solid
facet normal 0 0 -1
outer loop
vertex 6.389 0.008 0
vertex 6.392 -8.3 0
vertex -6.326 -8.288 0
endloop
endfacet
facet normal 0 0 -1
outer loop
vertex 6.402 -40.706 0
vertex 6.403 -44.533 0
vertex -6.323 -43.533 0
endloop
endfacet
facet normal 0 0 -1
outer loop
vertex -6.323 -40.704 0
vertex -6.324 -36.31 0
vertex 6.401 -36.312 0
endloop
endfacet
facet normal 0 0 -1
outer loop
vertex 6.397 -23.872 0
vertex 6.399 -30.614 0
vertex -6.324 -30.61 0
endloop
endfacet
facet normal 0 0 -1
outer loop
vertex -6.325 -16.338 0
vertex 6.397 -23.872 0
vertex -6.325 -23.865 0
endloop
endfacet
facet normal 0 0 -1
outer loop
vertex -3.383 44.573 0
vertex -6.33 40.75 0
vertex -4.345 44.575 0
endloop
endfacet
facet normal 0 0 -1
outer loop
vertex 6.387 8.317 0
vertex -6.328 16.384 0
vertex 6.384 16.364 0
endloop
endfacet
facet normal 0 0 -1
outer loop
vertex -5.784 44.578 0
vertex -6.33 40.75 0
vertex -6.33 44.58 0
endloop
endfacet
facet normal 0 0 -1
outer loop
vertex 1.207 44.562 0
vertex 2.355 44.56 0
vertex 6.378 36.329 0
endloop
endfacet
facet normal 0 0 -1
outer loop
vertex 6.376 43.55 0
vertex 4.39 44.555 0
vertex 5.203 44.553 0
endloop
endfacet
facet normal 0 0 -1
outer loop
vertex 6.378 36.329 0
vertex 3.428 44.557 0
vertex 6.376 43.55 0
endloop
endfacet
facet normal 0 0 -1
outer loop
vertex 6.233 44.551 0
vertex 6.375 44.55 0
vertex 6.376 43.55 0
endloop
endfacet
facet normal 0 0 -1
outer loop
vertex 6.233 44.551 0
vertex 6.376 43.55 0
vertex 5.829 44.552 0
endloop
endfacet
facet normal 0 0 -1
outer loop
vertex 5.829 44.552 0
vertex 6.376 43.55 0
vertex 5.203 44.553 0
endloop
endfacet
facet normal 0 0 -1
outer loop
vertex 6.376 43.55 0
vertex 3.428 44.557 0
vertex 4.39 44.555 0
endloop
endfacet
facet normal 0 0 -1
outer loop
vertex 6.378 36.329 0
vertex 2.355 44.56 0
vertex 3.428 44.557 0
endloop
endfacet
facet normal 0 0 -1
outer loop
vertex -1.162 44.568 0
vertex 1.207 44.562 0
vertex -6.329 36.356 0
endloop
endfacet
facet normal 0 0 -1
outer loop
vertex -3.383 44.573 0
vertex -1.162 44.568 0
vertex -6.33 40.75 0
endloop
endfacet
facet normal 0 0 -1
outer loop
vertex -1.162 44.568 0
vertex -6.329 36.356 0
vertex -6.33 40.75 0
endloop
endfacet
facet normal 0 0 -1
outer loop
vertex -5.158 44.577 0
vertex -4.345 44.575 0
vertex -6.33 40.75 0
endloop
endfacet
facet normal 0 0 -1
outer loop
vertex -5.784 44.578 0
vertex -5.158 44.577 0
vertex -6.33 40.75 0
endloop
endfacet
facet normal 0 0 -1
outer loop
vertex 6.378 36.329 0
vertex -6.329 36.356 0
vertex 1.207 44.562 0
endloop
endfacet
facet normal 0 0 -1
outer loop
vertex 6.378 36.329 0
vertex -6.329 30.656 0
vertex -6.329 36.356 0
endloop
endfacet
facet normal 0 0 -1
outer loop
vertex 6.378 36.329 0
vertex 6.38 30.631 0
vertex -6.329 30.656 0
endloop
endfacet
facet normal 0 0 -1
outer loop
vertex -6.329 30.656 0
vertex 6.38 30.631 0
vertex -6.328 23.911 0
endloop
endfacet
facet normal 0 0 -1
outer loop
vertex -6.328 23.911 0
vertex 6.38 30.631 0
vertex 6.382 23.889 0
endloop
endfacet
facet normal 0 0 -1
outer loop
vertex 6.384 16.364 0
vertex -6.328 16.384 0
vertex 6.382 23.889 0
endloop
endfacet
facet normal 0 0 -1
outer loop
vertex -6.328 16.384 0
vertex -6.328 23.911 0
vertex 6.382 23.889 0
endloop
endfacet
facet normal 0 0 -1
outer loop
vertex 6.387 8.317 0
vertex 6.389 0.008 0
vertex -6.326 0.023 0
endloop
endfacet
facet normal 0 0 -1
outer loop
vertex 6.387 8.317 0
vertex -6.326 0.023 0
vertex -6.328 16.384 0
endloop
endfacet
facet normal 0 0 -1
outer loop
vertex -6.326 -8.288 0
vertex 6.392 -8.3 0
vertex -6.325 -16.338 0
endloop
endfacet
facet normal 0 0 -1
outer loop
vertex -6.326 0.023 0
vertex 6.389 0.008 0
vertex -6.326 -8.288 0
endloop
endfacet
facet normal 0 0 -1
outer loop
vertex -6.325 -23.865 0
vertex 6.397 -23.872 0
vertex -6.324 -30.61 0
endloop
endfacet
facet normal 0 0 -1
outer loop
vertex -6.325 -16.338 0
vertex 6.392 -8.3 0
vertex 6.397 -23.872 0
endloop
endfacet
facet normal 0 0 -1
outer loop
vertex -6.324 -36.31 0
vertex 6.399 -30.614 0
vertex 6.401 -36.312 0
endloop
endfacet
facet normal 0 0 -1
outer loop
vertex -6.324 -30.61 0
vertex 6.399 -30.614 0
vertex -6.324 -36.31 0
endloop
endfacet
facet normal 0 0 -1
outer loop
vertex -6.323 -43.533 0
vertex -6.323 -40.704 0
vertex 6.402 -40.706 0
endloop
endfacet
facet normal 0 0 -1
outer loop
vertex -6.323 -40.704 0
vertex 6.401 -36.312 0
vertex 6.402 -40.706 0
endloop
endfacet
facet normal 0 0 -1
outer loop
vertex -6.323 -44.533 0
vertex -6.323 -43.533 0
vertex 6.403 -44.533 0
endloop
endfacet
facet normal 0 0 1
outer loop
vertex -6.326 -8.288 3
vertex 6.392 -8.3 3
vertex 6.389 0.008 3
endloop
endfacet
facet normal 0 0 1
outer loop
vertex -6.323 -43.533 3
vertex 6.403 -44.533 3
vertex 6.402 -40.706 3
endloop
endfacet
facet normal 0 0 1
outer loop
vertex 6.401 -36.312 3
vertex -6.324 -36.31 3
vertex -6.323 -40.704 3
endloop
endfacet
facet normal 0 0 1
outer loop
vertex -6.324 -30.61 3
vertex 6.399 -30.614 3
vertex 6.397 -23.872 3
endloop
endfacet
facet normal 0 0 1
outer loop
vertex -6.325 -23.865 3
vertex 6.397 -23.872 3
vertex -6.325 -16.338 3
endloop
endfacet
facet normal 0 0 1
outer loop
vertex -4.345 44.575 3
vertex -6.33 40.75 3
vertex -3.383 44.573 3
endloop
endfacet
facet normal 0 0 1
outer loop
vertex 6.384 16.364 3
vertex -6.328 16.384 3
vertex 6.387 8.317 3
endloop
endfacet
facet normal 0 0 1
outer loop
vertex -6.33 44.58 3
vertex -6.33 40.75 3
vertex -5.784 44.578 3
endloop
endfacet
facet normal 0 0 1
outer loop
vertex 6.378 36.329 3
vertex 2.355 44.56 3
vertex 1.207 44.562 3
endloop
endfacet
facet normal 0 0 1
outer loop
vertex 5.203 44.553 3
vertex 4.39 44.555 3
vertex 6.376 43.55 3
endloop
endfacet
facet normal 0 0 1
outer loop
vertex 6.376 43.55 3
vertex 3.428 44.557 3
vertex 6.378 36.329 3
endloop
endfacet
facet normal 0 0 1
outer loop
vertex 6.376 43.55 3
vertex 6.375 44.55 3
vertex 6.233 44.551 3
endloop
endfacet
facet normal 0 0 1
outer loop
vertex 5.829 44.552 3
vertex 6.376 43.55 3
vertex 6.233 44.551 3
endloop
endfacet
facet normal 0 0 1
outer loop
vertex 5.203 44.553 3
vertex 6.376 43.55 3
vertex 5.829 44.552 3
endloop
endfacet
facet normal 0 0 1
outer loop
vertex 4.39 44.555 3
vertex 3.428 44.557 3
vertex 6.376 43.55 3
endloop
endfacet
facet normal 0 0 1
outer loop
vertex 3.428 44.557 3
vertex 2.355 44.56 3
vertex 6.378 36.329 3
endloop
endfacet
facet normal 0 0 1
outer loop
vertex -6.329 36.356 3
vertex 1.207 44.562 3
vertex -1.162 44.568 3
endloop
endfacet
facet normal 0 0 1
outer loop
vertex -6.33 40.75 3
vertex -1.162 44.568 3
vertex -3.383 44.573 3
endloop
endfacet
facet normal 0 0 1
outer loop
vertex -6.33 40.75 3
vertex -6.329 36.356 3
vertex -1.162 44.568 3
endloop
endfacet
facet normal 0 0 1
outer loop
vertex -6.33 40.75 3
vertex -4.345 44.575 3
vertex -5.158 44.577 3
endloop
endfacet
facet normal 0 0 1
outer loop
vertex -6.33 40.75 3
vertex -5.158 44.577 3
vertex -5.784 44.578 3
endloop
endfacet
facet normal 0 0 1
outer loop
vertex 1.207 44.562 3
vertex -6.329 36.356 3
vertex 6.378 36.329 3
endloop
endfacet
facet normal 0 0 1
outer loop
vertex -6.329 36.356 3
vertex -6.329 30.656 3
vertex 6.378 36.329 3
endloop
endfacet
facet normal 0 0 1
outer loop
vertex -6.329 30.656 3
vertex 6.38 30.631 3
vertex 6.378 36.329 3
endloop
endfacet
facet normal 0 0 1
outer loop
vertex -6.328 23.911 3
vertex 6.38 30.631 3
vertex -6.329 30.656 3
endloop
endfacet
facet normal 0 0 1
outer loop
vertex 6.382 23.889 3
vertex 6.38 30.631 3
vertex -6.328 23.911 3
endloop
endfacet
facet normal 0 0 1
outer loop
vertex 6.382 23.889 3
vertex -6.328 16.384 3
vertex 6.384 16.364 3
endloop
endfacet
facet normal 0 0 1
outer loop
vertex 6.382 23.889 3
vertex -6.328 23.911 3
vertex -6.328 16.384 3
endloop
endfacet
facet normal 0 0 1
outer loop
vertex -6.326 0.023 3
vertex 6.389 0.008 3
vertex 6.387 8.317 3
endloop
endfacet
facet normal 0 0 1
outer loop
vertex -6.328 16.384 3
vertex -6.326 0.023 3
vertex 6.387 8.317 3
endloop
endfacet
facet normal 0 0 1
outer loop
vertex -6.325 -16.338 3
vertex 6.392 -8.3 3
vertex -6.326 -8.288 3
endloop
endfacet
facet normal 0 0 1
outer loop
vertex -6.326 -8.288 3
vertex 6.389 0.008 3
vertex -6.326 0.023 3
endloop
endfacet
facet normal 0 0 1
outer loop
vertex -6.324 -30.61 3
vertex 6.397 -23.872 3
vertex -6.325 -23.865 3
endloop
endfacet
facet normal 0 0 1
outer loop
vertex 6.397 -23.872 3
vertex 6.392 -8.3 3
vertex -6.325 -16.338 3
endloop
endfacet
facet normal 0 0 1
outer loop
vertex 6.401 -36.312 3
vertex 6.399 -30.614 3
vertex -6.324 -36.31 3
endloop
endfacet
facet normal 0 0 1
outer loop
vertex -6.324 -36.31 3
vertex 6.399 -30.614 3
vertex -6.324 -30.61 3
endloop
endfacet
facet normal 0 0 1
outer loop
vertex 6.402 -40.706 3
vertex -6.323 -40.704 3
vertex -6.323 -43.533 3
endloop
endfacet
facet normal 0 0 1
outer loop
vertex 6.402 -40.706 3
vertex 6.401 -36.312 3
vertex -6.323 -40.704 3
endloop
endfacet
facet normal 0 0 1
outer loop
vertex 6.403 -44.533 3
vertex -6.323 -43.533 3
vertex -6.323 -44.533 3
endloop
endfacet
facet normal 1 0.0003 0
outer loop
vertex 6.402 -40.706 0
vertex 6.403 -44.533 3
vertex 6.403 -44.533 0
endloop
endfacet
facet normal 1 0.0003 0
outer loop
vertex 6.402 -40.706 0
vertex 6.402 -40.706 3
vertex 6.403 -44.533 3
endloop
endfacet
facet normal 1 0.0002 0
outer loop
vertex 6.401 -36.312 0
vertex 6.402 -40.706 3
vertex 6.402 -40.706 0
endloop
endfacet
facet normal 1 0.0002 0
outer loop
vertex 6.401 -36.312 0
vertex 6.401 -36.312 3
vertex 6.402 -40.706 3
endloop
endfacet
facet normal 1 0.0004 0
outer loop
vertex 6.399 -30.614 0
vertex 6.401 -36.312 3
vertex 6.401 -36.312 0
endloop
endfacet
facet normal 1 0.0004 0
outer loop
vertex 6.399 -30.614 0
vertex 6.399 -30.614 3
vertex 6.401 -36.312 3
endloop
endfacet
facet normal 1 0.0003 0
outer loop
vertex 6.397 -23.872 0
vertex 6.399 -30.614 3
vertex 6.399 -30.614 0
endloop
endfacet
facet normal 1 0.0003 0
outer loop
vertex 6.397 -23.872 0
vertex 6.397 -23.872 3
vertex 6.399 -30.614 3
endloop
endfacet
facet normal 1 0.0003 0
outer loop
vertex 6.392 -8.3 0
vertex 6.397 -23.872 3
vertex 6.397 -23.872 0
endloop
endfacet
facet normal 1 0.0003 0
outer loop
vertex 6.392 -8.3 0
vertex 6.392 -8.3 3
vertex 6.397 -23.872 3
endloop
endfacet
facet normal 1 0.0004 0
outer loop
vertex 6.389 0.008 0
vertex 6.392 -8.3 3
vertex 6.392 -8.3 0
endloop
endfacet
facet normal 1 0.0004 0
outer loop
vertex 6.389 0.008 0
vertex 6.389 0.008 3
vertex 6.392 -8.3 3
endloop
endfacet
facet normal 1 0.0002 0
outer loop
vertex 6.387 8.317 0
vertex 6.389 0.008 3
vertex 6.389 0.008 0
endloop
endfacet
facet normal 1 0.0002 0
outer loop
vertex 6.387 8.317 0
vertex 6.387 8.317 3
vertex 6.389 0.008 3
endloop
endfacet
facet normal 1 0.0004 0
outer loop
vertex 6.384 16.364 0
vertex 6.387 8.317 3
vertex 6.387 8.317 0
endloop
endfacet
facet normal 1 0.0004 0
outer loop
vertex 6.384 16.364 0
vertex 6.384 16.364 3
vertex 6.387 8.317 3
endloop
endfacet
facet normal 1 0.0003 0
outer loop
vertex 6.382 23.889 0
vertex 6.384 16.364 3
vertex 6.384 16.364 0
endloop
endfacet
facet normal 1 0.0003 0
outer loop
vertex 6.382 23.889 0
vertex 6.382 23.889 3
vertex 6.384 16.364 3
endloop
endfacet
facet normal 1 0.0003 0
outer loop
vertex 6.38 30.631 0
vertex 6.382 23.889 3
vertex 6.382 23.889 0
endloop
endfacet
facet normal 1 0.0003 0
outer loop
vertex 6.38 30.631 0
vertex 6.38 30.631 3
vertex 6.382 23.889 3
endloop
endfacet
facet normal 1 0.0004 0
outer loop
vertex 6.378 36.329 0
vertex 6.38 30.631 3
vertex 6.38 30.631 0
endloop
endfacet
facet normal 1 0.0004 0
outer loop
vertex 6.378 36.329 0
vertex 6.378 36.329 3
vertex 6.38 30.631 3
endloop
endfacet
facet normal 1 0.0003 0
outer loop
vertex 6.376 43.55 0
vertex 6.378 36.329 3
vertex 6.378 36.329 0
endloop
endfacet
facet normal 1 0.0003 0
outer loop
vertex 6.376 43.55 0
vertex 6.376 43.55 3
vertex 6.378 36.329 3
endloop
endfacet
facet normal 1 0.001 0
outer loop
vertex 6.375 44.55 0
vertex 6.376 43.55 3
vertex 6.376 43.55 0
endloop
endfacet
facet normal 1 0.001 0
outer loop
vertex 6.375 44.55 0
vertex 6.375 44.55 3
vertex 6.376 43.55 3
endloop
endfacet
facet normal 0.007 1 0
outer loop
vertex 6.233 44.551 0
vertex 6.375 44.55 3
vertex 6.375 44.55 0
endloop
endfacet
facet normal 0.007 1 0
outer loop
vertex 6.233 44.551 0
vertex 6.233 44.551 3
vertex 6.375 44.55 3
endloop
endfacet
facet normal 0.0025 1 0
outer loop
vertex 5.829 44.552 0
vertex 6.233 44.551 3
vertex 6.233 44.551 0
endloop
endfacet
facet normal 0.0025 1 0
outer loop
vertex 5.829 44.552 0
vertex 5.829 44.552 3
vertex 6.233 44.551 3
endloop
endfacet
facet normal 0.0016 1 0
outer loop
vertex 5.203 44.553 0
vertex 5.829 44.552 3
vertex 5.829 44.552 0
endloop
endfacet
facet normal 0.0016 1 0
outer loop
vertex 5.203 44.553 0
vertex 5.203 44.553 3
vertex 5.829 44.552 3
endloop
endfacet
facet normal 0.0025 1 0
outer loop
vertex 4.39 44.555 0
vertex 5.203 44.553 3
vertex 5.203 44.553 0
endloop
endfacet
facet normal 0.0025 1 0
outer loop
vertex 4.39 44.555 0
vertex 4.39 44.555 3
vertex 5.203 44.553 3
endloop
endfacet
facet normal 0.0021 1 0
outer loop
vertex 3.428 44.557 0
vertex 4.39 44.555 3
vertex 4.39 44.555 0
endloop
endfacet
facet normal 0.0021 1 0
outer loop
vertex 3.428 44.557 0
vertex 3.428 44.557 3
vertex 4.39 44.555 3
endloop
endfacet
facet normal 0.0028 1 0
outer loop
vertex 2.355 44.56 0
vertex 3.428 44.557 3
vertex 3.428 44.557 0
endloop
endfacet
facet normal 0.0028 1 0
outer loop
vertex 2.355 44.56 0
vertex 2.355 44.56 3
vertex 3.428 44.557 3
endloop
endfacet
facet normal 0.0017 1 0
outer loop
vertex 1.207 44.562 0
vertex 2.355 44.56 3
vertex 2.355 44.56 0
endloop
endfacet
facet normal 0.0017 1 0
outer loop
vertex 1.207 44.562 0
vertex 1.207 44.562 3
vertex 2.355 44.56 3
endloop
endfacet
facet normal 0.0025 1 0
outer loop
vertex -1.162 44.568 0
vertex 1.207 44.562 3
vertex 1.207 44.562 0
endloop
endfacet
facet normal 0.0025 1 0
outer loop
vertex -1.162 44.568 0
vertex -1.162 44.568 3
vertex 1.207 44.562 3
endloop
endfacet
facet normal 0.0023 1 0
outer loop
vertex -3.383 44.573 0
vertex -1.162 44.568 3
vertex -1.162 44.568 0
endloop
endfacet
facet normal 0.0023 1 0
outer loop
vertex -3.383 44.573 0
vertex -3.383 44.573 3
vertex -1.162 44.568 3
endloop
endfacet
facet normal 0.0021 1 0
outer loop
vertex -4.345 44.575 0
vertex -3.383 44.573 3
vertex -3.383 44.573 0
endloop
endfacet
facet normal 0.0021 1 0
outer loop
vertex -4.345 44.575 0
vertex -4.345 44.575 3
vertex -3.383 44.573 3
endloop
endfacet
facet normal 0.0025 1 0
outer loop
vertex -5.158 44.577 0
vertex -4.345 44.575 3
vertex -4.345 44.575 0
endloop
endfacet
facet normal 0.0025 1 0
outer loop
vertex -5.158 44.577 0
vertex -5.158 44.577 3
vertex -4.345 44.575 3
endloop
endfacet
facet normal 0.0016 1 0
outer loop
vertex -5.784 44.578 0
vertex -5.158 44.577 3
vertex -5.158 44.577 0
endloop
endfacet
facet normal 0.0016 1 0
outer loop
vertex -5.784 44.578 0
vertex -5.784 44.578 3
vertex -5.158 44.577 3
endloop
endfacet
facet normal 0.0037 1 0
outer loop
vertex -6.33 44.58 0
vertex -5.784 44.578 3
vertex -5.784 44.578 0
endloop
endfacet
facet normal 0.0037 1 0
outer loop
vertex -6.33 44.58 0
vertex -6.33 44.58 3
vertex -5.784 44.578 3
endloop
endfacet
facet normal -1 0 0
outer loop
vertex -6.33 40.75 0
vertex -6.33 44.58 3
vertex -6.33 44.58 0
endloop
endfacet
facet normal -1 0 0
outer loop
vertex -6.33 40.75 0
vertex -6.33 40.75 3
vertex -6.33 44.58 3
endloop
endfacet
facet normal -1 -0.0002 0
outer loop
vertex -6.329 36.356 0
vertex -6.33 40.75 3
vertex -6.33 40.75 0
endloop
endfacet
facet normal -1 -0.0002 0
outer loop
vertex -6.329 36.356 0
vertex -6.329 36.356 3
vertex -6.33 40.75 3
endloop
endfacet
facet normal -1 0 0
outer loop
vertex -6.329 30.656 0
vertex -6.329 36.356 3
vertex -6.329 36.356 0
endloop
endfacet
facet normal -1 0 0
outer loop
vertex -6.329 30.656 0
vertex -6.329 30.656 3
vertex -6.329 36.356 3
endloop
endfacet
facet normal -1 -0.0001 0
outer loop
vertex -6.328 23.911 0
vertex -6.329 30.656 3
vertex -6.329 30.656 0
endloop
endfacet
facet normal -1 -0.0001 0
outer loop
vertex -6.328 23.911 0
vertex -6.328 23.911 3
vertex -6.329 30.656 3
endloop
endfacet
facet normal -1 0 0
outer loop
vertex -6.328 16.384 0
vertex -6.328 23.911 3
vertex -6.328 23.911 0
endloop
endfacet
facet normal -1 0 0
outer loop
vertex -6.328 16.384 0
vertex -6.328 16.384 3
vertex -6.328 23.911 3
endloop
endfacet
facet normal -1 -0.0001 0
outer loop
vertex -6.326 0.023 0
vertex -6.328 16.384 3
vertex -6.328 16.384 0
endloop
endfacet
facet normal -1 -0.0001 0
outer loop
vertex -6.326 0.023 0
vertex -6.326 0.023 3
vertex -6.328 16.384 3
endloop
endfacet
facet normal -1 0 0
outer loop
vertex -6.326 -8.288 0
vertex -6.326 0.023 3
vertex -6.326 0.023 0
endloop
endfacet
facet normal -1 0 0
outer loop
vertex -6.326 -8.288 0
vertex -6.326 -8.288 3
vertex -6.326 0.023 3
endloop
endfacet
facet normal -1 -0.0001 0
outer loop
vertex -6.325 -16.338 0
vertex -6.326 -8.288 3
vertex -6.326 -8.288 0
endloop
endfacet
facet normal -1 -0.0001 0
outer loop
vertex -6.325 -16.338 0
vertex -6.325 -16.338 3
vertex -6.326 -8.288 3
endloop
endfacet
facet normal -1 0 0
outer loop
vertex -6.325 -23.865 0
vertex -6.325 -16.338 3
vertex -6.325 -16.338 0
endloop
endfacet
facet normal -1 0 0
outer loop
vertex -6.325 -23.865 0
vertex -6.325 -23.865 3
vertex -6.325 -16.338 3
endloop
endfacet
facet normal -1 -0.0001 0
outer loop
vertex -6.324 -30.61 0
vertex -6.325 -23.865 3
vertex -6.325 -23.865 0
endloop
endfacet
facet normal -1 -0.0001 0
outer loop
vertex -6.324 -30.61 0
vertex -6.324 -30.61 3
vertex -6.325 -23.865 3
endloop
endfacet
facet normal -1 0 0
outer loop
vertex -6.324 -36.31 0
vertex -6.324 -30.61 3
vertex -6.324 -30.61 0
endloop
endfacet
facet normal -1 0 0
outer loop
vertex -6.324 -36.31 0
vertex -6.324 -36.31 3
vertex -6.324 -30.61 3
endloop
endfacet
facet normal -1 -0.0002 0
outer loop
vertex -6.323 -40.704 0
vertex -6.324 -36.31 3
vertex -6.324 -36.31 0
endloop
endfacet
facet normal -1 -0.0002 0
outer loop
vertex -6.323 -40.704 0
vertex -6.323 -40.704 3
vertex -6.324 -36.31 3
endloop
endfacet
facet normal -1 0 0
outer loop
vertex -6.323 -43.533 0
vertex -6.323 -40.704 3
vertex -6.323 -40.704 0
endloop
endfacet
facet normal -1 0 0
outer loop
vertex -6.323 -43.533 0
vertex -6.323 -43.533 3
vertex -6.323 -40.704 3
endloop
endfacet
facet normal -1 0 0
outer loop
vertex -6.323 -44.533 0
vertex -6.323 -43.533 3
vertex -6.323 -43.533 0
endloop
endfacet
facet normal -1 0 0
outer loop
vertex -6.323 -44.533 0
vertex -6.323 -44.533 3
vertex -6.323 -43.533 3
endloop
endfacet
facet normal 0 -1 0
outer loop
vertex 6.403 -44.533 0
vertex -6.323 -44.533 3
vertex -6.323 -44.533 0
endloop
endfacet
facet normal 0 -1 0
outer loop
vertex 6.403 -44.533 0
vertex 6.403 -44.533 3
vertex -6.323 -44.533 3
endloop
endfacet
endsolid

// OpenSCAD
// Generated from 交通部公路局（原交通部公路總局）「新式號牌使用之英文字、數字字體」author trace
fudge = 0.1;

module glyph_2012_1(h = 3) {
  difference() {
    linear_extrude(height = h)
      polygon(points = [[-6.3302, 44.5796], [-6.3301, 43.5788], [-6.3299, 40.7505], [-6.3295, 36.3558], [-6.3291, 30.6557], [-6.3285, 23.9113], [-6.3279, 16.3837], [-6.3272, 8.3339], [-6.3265, 0.0231], [-6.3259, -8.2878], [-6.3252, -16.3376], [-6.3246, -23.8652], [-6.324, -30.6096], [-6.3236, -36.3097], [-6.3232, -40.7044], [-6.323, -43.5327], [-6.3229, -44.5335], [-6.18, -44.5335], [-5.7761, -44.5335], [-5.1485, -44.5335], [-4.3344, -44.5335], [-3.3713, -44.5335], [-2.2962, -44.5335], [-1.1466, -44.5335], [0.0402, -44.5335], [1.2271, -44.5335], [2.3767, -44.5335], [3.4517, -44.5335], [4.4149, -44.5335], [5.2289, -44.5335], [5.8565, -44.5335], [6.2604, -44.5335], [6.4033, -44.5335], [6.403, -43.5331], [6.4021, -40.7057], [6.4008, -36.3124], [6.399, -30.6142], [6.3968, -23.872], [6.3945, -16.3468], [6.392, -8.2997], [6.3894, 0.0084], [6.3867, 8.3166], [6.3842, 16.3637], [6.3819, 23.8888], [6.3797, 30.631], [6.378, 36.3293], [6.3766, 40.7226], [6.3757, 43.5499], [6.3754, 44.5504], [6.2327, 44.5507], [5.8294, 44.5517], [5.2028, 44.5531], [4.3901, 44.555], [3.4285, 44.5572], [2.3553, 44.5596], [1.2075, 44.5623], [0.0226, 44.565], [-1.1624, 44.5677], [-2.3101, 44.5704], [-3.3833, 44.5729], [-4.3449, 44.5751], [-5.1577, 44.5769], [-5.7843, 44.5784], [-6.1875, 44.5793]]);
  }
}

glyph_2012_1();
